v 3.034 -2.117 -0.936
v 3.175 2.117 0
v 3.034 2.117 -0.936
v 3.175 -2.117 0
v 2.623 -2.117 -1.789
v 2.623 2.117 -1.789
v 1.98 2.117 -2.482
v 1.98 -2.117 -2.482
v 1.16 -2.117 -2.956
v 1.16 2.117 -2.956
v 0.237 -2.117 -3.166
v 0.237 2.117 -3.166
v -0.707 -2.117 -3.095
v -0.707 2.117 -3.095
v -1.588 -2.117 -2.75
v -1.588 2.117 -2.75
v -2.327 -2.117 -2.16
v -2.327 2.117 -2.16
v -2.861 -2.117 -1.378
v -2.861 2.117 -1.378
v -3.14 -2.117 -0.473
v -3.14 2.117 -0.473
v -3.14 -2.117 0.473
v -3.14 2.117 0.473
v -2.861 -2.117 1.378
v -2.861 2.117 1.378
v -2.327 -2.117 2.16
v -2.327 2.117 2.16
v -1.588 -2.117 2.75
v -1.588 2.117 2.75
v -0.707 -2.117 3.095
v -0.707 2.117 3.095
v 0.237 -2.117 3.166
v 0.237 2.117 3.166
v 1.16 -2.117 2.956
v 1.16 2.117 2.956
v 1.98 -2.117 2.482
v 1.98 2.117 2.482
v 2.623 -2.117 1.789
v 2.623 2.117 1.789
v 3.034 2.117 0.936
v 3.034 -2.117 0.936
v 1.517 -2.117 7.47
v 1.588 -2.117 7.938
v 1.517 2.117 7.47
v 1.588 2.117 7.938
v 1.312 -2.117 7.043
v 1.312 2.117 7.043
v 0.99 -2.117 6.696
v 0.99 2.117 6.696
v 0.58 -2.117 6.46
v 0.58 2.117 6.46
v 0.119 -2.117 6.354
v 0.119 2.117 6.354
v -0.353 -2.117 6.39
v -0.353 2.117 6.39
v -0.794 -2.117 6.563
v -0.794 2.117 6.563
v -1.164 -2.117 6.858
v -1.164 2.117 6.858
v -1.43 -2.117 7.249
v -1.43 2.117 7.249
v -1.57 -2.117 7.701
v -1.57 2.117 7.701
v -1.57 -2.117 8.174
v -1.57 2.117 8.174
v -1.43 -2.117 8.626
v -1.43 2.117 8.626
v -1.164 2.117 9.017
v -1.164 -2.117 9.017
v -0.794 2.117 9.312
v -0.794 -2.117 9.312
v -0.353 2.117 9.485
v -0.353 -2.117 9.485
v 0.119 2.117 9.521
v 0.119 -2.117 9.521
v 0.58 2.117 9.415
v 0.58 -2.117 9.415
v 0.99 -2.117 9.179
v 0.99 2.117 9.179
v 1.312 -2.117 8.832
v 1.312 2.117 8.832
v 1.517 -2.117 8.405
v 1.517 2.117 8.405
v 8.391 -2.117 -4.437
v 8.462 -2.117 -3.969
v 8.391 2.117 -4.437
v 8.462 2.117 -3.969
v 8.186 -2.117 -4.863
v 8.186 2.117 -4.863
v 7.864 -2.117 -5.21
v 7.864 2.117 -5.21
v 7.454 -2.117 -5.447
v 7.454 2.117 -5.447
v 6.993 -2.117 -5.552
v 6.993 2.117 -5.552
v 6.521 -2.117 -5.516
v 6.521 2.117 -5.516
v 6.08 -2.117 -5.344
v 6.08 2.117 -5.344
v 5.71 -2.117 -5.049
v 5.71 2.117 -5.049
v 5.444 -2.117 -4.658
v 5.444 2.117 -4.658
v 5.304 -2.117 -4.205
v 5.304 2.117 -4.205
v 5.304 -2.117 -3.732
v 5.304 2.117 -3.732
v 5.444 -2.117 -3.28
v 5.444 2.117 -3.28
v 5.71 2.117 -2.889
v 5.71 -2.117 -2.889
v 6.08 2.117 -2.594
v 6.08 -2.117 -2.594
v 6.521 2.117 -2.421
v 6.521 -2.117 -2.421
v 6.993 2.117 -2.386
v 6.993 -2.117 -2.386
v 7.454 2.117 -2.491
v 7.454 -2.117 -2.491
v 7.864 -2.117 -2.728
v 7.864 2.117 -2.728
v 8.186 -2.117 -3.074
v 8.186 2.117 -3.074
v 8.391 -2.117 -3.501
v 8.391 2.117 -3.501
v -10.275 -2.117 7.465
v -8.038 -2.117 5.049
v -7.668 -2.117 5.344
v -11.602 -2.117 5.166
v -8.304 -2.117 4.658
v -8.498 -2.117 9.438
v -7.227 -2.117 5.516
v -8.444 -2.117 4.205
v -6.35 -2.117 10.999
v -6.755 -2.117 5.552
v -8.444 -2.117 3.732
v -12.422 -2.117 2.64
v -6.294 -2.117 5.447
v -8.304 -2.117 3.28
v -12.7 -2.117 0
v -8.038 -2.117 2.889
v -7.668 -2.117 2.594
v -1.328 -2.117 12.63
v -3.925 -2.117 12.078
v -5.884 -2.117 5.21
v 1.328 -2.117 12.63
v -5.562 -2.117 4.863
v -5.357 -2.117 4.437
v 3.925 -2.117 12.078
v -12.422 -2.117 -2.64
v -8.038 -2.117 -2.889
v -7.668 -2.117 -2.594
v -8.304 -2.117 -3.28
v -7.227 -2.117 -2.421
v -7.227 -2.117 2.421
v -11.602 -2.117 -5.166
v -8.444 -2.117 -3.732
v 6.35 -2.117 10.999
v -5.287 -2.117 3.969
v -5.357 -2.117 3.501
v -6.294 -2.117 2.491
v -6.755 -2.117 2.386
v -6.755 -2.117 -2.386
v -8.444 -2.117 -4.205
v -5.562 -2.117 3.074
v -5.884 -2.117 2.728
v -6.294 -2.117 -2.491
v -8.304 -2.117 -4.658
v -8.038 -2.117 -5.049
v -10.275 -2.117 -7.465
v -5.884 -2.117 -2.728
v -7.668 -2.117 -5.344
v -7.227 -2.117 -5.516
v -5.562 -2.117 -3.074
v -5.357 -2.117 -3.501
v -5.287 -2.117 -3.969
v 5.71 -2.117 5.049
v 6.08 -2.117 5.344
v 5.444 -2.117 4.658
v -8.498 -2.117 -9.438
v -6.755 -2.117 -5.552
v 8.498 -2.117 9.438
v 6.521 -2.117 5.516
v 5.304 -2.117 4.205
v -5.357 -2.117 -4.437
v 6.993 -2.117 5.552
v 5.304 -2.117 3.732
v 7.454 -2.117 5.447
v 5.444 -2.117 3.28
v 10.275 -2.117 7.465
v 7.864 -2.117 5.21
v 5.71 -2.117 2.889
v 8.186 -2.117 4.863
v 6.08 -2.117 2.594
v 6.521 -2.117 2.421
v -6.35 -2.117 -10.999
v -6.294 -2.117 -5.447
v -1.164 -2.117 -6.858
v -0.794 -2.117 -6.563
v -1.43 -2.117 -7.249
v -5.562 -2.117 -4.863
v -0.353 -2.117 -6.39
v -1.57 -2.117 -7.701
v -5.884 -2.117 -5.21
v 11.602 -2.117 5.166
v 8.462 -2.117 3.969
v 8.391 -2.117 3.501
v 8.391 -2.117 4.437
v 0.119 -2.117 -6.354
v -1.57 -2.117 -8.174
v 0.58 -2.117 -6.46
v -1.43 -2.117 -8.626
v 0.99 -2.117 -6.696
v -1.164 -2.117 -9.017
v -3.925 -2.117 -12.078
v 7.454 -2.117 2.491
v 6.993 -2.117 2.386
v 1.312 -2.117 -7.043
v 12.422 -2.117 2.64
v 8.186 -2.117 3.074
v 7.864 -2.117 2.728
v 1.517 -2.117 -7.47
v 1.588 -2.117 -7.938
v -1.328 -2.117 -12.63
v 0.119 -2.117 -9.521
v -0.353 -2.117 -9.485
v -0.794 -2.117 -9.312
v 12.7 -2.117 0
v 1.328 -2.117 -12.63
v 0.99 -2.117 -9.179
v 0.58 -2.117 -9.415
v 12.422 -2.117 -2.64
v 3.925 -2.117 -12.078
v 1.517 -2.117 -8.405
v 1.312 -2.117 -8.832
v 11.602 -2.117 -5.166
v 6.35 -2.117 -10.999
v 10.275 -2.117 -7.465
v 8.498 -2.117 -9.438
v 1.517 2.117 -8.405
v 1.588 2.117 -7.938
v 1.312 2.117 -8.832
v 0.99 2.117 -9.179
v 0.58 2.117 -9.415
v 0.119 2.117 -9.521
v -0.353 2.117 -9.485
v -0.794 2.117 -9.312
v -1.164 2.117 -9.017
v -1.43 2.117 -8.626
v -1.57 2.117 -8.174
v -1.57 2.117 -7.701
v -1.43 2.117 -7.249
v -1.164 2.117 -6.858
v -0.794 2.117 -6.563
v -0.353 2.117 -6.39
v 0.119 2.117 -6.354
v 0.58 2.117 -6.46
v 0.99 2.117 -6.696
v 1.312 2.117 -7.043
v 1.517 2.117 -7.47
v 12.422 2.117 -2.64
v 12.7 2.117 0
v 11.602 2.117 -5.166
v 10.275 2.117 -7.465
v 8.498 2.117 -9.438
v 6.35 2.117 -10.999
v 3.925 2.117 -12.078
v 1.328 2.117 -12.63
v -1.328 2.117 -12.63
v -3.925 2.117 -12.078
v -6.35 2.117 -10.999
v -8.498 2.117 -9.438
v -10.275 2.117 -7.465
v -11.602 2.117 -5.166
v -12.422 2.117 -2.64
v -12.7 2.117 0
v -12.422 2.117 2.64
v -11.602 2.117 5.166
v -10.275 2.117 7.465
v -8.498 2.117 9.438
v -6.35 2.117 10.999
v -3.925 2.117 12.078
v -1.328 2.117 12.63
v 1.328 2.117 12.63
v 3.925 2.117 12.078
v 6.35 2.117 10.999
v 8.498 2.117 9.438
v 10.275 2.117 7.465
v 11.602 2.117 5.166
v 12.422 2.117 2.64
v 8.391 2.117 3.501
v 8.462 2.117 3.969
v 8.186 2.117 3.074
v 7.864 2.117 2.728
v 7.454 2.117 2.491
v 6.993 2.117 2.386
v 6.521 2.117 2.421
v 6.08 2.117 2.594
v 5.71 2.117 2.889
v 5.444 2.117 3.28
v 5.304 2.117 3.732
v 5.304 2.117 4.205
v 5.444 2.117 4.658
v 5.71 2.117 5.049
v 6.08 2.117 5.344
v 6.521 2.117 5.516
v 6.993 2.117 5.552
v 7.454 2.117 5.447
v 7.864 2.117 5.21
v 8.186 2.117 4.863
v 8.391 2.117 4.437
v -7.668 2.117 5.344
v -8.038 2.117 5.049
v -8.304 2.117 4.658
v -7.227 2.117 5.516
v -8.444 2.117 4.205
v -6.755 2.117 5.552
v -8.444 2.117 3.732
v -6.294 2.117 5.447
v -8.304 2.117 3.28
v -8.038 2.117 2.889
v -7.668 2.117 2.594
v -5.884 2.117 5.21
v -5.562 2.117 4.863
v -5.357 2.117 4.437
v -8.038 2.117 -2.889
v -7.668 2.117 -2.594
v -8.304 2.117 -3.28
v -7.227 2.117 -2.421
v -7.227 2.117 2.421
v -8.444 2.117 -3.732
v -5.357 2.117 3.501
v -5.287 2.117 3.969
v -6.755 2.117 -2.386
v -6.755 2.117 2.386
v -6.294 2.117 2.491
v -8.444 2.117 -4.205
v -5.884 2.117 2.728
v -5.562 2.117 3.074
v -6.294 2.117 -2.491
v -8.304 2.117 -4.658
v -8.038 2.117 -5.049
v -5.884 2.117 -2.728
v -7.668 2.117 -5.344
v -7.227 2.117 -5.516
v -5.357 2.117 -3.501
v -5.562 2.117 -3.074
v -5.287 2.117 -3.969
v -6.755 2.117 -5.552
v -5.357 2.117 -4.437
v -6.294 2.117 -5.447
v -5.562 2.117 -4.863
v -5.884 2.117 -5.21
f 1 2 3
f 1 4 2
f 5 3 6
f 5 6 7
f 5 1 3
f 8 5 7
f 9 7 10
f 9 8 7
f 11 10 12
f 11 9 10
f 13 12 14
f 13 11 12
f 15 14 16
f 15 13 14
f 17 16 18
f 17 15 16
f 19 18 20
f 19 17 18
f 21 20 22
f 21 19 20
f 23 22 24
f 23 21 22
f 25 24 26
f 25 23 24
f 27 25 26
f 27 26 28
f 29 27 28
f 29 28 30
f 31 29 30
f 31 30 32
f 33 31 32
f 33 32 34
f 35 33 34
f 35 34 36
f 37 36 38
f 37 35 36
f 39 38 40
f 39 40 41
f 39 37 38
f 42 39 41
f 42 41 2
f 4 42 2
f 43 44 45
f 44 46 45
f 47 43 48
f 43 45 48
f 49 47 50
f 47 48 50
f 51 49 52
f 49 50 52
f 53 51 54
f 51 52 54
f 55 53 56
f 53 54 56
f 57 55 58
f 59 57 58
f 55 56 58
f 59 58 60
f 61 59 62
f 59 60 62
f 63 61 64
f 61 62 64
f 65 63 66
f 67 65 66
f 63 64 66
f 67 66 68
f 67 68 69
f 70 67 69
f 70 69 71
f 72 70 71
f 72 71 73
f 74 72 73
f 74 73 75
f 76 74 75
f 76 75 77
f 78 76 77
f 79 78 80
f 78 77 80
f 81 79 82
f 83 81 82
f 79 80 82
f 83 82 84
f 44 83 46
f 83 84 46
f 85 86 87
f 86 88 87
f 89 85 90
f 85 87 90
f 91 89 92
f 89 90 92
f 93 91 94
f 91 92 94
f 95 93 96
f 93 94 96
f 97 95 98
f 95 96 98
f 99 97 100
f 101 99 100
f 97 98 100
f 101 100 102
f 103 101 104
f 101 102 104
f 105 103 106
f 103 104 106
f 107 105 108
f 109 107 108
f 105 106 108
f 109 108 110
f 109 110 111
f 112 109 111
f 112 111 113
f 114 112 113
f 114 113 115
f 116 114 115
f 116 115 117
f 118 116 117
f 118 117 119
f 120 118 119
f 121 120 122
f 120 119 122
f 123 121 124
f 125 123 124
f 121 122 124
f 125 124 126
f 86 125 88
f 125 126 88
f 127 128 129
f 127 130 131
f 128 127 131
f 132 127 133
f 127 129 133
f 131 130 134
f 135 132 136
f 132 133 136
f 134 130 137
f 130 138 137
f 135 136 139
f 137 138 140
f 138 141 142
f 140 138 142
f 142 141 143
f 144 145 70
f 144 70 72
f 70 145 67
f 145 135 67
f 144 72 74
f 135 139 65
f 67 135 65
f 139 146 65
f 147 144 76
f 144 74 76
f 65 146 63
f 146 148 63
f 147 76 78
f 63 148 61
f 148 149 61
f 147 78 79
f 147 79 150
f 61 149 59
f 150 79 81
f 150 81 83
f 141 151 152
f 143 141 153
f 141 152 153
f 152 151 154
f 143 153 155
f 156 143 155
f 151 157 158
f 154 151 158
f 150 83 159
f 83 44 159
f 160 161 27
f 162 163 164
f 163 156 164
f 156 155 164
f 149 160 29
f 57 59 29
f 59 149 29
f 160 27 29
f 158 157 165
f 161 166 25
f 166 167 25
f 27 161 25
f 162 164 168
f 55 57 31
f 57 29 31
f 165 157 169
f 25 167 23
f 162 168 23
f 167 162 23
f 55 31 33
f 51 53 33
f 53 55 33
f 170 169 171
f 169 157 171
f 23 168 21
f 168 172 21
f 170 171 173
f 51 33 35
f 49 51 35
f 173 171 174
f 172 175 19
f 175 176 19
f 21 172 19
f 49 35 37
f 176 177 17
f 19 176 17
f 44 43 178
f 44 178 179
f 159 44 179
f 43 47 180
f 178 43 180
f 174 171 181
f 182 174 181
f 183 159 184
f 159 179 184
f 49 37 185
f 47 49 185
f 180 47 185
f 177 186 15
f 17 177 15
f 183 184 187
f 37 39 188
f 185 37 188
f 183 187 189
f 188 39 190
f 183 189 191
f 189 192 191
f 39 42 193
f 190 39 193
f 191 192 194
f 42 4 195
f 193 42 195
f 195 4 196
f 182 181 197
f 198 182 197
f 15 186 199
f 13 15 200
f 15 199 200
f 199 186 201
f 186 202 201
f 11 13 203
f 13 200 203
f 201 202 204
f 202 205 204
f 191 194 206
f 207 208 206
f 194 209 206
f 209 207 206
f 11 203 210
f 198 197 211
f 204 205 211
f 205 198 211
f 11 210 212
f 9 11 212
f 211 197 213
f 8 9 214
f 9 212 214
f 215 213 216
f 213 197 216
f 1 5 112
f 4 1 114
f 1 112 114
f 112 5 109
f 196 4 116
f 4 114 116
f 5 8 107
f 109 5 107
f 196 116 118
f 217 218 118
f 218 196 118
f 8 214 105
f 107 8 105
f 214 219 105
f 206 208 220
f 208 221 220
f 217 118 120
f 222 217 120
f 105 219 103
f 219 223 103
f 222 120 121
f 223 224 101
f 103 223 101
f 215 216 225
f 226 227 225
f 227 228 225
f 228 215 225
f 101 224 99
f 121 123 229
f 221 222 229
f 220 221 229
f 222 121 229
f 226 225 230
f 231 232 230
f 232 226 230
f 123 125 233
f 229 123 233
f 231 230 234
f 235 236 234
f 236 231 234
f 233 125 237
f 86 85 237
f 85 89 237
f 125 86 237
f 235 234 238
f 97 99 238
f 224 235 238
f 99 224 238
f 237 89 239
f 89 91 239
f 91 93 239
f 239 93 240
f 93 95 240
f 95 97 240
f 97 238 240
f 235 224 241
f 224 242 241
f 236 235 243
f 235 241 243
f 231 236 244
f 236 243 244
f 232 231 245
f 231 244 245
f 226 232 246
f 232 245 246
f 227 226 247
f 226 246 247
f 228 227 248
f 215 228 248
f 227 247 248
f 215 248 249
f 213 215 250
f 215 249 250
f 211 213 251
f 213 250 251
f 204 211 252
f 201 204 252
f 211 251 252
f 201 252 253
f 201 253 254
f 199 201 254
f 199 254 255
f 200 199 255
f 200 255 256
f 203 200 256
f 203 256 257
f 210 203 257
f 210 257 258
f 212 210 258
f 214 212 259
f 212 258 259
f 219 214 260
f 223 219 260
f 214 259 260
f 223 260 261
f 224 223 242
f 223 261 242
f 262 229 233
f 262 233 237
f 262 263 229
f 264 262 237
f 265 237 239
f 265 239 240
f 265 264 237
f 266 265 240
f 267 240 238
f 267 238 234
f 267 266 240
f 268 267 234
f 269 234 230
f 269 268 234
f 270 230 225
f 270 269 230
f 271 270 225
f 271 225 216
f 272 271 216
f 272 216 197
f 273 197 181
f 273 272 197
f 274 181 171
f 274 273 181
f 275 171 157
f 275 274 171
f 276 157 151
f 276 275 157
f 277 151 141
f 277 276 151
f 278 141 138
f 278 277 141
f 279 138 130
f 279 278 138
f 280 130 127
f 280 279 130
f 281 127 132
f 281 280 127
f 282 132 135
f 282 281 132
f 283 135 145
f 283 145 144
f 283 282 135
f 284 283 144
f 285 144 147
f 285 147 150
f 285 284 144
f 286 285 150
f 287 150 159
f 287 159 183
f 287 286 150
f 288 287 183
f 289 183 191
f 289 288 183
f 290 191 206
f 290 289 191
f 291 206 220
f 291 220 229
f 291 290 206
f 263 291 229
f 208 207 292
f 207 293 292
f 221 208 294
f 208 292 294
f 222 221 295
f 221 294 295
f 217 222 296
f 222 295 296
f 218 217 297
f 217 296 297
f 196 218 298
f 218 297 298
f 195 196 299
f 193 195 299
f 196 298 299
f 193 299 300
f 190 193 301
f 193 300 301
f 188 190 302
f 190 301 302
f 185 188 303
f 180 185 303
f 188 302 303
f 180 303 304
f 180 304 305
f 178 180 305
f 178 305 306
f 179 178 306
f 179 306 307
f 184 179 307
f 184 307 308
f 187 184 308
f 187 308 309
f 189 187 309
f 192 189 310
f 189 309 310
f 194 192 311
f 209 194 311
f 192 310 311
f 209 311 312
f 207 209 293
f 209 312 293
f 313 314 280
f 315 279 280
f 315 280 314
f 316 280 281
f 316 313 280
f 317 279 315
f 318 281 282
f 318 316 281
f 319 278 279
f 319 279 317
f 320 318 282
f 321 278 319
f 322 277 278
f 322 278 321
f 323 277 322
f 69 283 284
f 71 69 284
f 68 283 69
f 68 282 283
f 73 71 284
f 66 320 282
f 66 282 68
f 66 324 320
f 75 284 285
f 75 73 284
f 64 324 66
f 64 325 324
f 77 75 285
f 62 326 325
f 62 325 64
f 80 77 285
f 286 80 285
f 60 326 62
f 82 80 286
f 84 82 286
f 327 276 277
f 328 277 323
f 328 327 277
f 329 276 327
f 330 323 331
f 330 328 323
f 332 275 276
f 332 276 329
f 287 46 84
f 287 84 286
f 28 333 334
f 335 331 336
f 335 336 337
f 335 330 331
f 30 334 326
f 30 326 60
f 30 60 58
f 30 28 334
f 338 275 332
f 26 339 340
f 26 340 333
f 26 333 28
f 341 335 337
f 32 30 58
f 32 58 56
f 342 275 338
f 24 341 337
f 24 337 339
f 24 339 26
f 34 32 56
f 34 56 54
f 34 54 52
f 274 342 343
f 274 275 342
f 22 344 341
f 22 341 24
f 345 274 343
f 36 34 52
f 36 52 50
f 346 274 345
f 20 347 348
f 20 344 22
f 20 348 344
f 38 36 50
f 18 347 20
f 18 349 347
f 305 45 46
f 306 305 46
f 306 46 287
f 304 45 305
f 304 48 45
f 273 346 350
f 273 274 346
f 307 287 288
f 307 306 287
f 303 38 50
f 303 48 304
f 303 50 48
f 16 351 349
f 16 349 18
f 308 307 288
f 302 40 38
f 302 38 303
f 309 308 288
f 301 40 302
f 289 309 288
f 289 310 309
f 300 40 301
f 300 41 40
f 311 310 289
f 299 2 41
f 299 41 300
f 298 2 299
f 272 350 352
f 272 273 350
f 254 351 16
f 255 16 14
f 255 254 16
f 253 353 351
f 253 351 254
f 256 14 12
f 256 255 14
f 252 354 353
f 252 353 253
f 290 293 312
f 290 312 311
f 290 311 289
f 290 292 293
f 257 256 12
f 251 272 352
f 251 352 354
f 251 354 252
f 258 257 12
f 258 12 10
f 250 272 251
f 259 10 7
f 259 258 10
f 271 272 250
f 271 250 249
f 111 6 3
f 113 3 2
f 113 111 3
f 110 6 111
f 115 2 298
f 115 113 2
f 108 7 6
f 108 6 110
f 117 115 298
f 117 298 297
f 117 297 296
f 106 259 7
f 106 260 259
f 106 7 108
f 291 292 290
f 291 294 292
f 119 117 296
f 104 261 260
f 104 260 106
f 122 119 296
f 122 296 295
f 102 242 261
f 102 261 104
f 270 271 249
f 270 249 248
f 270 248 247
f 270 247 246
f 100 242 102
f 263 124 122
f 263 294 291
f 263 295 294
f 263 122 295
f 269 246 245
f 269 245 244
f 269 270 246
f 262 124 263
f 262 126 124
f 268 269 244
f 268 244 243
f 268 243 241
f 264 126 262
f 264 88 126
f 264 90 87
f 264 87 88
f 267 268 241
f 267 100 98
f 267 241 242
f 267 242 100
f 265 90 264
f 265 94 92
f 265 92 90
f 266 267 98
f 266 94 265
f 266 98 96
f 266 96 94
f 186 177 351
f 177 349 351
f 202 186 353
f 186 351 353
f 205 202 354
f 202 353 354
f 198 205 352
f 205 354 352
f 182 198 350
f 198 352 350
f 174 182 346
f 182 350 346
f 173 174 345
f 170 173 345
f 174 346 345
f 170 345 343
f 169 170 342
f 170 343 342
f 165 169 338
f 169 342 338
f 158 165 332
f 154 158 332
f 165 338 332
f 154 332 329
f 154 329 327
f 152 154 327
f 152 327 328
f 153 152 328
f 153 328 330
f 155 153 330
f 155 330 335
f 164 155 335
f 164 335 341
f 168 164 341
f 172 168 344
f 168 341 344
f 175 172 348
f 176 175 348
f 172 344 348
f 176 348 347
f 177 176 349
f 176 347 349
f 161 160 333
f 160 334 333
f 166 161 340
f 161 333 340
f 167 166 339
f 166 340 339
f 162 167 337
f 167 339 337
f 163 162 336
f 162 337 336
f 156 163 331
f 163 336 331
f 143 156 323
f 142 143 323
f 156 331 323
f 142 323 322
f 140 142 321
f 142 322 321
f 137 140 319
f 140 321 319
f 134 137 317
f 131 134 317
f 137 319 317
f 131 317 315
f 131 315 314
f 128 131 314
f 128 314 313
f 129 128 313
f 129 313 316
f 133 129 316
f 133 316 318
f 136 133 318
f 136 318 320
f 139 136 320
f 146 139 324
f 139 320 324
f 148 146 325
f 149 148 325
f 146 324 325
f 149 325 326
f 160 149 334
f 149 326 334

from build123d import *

# Parameters (mm, degrees)
SKETCH1_R               = 12.7
SKETCH1_R_2             = 3.175
BOSS_EXTRUDE1_DEPTH     = 2.116666667
SKETCH2_R               = 1.5875
CUT_EXTRUDE1_DEPTH      = 3.116666667
CUT_EXTRUDE1_DEPTH_BACK = 3.116666667


with BuildPart() as part:
    # Sketch1 → Boss-Extrude1 (new body, symmetric)
    with BuildSketch(Plane(origin=(0, 0, 0), x_dir=(1, 0, 0), z_dir=(0, 1, 0))):
        Circle(SKETCH1_R)
        Circle(SKETCH1_R_2, mode=Mode.SUBTRACT)
    extrude(amount=BOSS_EXTRUDE1_DEPTH, both=True)

    # Sketch2 → Cut-Extrude1 (cut, two sides)
    with BuildSketch(Plane(origin=(0, 0, 0), x_dir=(1, 0, 0), z_dir=(0, 1, 0))) as cut_extrude1_sk:
        with Locations((0, 7.9375)):
            Circle(SKETCH2_R)
        with Locations((6.874076643, 3.96875)):
            Circle(SKETCH2_R)
        with Locations((6.874076643, -3.96875)):
            Circle(SKETCH2_R)
        with Locations((0, -7.9375)):
            Circle(SKETCH2_R)
        with Locations((-6.874076643, -3.96875)):
            Circle(SKETCH2_R)
        with Locations((-6.874076643, 3.96875)):
            Circle(SKETCH2_R)
    extrude(amount=CUT_EXTRUDE1_DEPTH, mode=Mode.SUBTRACT)
    extrude(cut_extrude1_sk.sketch, amount=-CUT_EXTRUDE1_DEPTH_BACK, mode=Mode.SUBTRACT)


solid = part.part
